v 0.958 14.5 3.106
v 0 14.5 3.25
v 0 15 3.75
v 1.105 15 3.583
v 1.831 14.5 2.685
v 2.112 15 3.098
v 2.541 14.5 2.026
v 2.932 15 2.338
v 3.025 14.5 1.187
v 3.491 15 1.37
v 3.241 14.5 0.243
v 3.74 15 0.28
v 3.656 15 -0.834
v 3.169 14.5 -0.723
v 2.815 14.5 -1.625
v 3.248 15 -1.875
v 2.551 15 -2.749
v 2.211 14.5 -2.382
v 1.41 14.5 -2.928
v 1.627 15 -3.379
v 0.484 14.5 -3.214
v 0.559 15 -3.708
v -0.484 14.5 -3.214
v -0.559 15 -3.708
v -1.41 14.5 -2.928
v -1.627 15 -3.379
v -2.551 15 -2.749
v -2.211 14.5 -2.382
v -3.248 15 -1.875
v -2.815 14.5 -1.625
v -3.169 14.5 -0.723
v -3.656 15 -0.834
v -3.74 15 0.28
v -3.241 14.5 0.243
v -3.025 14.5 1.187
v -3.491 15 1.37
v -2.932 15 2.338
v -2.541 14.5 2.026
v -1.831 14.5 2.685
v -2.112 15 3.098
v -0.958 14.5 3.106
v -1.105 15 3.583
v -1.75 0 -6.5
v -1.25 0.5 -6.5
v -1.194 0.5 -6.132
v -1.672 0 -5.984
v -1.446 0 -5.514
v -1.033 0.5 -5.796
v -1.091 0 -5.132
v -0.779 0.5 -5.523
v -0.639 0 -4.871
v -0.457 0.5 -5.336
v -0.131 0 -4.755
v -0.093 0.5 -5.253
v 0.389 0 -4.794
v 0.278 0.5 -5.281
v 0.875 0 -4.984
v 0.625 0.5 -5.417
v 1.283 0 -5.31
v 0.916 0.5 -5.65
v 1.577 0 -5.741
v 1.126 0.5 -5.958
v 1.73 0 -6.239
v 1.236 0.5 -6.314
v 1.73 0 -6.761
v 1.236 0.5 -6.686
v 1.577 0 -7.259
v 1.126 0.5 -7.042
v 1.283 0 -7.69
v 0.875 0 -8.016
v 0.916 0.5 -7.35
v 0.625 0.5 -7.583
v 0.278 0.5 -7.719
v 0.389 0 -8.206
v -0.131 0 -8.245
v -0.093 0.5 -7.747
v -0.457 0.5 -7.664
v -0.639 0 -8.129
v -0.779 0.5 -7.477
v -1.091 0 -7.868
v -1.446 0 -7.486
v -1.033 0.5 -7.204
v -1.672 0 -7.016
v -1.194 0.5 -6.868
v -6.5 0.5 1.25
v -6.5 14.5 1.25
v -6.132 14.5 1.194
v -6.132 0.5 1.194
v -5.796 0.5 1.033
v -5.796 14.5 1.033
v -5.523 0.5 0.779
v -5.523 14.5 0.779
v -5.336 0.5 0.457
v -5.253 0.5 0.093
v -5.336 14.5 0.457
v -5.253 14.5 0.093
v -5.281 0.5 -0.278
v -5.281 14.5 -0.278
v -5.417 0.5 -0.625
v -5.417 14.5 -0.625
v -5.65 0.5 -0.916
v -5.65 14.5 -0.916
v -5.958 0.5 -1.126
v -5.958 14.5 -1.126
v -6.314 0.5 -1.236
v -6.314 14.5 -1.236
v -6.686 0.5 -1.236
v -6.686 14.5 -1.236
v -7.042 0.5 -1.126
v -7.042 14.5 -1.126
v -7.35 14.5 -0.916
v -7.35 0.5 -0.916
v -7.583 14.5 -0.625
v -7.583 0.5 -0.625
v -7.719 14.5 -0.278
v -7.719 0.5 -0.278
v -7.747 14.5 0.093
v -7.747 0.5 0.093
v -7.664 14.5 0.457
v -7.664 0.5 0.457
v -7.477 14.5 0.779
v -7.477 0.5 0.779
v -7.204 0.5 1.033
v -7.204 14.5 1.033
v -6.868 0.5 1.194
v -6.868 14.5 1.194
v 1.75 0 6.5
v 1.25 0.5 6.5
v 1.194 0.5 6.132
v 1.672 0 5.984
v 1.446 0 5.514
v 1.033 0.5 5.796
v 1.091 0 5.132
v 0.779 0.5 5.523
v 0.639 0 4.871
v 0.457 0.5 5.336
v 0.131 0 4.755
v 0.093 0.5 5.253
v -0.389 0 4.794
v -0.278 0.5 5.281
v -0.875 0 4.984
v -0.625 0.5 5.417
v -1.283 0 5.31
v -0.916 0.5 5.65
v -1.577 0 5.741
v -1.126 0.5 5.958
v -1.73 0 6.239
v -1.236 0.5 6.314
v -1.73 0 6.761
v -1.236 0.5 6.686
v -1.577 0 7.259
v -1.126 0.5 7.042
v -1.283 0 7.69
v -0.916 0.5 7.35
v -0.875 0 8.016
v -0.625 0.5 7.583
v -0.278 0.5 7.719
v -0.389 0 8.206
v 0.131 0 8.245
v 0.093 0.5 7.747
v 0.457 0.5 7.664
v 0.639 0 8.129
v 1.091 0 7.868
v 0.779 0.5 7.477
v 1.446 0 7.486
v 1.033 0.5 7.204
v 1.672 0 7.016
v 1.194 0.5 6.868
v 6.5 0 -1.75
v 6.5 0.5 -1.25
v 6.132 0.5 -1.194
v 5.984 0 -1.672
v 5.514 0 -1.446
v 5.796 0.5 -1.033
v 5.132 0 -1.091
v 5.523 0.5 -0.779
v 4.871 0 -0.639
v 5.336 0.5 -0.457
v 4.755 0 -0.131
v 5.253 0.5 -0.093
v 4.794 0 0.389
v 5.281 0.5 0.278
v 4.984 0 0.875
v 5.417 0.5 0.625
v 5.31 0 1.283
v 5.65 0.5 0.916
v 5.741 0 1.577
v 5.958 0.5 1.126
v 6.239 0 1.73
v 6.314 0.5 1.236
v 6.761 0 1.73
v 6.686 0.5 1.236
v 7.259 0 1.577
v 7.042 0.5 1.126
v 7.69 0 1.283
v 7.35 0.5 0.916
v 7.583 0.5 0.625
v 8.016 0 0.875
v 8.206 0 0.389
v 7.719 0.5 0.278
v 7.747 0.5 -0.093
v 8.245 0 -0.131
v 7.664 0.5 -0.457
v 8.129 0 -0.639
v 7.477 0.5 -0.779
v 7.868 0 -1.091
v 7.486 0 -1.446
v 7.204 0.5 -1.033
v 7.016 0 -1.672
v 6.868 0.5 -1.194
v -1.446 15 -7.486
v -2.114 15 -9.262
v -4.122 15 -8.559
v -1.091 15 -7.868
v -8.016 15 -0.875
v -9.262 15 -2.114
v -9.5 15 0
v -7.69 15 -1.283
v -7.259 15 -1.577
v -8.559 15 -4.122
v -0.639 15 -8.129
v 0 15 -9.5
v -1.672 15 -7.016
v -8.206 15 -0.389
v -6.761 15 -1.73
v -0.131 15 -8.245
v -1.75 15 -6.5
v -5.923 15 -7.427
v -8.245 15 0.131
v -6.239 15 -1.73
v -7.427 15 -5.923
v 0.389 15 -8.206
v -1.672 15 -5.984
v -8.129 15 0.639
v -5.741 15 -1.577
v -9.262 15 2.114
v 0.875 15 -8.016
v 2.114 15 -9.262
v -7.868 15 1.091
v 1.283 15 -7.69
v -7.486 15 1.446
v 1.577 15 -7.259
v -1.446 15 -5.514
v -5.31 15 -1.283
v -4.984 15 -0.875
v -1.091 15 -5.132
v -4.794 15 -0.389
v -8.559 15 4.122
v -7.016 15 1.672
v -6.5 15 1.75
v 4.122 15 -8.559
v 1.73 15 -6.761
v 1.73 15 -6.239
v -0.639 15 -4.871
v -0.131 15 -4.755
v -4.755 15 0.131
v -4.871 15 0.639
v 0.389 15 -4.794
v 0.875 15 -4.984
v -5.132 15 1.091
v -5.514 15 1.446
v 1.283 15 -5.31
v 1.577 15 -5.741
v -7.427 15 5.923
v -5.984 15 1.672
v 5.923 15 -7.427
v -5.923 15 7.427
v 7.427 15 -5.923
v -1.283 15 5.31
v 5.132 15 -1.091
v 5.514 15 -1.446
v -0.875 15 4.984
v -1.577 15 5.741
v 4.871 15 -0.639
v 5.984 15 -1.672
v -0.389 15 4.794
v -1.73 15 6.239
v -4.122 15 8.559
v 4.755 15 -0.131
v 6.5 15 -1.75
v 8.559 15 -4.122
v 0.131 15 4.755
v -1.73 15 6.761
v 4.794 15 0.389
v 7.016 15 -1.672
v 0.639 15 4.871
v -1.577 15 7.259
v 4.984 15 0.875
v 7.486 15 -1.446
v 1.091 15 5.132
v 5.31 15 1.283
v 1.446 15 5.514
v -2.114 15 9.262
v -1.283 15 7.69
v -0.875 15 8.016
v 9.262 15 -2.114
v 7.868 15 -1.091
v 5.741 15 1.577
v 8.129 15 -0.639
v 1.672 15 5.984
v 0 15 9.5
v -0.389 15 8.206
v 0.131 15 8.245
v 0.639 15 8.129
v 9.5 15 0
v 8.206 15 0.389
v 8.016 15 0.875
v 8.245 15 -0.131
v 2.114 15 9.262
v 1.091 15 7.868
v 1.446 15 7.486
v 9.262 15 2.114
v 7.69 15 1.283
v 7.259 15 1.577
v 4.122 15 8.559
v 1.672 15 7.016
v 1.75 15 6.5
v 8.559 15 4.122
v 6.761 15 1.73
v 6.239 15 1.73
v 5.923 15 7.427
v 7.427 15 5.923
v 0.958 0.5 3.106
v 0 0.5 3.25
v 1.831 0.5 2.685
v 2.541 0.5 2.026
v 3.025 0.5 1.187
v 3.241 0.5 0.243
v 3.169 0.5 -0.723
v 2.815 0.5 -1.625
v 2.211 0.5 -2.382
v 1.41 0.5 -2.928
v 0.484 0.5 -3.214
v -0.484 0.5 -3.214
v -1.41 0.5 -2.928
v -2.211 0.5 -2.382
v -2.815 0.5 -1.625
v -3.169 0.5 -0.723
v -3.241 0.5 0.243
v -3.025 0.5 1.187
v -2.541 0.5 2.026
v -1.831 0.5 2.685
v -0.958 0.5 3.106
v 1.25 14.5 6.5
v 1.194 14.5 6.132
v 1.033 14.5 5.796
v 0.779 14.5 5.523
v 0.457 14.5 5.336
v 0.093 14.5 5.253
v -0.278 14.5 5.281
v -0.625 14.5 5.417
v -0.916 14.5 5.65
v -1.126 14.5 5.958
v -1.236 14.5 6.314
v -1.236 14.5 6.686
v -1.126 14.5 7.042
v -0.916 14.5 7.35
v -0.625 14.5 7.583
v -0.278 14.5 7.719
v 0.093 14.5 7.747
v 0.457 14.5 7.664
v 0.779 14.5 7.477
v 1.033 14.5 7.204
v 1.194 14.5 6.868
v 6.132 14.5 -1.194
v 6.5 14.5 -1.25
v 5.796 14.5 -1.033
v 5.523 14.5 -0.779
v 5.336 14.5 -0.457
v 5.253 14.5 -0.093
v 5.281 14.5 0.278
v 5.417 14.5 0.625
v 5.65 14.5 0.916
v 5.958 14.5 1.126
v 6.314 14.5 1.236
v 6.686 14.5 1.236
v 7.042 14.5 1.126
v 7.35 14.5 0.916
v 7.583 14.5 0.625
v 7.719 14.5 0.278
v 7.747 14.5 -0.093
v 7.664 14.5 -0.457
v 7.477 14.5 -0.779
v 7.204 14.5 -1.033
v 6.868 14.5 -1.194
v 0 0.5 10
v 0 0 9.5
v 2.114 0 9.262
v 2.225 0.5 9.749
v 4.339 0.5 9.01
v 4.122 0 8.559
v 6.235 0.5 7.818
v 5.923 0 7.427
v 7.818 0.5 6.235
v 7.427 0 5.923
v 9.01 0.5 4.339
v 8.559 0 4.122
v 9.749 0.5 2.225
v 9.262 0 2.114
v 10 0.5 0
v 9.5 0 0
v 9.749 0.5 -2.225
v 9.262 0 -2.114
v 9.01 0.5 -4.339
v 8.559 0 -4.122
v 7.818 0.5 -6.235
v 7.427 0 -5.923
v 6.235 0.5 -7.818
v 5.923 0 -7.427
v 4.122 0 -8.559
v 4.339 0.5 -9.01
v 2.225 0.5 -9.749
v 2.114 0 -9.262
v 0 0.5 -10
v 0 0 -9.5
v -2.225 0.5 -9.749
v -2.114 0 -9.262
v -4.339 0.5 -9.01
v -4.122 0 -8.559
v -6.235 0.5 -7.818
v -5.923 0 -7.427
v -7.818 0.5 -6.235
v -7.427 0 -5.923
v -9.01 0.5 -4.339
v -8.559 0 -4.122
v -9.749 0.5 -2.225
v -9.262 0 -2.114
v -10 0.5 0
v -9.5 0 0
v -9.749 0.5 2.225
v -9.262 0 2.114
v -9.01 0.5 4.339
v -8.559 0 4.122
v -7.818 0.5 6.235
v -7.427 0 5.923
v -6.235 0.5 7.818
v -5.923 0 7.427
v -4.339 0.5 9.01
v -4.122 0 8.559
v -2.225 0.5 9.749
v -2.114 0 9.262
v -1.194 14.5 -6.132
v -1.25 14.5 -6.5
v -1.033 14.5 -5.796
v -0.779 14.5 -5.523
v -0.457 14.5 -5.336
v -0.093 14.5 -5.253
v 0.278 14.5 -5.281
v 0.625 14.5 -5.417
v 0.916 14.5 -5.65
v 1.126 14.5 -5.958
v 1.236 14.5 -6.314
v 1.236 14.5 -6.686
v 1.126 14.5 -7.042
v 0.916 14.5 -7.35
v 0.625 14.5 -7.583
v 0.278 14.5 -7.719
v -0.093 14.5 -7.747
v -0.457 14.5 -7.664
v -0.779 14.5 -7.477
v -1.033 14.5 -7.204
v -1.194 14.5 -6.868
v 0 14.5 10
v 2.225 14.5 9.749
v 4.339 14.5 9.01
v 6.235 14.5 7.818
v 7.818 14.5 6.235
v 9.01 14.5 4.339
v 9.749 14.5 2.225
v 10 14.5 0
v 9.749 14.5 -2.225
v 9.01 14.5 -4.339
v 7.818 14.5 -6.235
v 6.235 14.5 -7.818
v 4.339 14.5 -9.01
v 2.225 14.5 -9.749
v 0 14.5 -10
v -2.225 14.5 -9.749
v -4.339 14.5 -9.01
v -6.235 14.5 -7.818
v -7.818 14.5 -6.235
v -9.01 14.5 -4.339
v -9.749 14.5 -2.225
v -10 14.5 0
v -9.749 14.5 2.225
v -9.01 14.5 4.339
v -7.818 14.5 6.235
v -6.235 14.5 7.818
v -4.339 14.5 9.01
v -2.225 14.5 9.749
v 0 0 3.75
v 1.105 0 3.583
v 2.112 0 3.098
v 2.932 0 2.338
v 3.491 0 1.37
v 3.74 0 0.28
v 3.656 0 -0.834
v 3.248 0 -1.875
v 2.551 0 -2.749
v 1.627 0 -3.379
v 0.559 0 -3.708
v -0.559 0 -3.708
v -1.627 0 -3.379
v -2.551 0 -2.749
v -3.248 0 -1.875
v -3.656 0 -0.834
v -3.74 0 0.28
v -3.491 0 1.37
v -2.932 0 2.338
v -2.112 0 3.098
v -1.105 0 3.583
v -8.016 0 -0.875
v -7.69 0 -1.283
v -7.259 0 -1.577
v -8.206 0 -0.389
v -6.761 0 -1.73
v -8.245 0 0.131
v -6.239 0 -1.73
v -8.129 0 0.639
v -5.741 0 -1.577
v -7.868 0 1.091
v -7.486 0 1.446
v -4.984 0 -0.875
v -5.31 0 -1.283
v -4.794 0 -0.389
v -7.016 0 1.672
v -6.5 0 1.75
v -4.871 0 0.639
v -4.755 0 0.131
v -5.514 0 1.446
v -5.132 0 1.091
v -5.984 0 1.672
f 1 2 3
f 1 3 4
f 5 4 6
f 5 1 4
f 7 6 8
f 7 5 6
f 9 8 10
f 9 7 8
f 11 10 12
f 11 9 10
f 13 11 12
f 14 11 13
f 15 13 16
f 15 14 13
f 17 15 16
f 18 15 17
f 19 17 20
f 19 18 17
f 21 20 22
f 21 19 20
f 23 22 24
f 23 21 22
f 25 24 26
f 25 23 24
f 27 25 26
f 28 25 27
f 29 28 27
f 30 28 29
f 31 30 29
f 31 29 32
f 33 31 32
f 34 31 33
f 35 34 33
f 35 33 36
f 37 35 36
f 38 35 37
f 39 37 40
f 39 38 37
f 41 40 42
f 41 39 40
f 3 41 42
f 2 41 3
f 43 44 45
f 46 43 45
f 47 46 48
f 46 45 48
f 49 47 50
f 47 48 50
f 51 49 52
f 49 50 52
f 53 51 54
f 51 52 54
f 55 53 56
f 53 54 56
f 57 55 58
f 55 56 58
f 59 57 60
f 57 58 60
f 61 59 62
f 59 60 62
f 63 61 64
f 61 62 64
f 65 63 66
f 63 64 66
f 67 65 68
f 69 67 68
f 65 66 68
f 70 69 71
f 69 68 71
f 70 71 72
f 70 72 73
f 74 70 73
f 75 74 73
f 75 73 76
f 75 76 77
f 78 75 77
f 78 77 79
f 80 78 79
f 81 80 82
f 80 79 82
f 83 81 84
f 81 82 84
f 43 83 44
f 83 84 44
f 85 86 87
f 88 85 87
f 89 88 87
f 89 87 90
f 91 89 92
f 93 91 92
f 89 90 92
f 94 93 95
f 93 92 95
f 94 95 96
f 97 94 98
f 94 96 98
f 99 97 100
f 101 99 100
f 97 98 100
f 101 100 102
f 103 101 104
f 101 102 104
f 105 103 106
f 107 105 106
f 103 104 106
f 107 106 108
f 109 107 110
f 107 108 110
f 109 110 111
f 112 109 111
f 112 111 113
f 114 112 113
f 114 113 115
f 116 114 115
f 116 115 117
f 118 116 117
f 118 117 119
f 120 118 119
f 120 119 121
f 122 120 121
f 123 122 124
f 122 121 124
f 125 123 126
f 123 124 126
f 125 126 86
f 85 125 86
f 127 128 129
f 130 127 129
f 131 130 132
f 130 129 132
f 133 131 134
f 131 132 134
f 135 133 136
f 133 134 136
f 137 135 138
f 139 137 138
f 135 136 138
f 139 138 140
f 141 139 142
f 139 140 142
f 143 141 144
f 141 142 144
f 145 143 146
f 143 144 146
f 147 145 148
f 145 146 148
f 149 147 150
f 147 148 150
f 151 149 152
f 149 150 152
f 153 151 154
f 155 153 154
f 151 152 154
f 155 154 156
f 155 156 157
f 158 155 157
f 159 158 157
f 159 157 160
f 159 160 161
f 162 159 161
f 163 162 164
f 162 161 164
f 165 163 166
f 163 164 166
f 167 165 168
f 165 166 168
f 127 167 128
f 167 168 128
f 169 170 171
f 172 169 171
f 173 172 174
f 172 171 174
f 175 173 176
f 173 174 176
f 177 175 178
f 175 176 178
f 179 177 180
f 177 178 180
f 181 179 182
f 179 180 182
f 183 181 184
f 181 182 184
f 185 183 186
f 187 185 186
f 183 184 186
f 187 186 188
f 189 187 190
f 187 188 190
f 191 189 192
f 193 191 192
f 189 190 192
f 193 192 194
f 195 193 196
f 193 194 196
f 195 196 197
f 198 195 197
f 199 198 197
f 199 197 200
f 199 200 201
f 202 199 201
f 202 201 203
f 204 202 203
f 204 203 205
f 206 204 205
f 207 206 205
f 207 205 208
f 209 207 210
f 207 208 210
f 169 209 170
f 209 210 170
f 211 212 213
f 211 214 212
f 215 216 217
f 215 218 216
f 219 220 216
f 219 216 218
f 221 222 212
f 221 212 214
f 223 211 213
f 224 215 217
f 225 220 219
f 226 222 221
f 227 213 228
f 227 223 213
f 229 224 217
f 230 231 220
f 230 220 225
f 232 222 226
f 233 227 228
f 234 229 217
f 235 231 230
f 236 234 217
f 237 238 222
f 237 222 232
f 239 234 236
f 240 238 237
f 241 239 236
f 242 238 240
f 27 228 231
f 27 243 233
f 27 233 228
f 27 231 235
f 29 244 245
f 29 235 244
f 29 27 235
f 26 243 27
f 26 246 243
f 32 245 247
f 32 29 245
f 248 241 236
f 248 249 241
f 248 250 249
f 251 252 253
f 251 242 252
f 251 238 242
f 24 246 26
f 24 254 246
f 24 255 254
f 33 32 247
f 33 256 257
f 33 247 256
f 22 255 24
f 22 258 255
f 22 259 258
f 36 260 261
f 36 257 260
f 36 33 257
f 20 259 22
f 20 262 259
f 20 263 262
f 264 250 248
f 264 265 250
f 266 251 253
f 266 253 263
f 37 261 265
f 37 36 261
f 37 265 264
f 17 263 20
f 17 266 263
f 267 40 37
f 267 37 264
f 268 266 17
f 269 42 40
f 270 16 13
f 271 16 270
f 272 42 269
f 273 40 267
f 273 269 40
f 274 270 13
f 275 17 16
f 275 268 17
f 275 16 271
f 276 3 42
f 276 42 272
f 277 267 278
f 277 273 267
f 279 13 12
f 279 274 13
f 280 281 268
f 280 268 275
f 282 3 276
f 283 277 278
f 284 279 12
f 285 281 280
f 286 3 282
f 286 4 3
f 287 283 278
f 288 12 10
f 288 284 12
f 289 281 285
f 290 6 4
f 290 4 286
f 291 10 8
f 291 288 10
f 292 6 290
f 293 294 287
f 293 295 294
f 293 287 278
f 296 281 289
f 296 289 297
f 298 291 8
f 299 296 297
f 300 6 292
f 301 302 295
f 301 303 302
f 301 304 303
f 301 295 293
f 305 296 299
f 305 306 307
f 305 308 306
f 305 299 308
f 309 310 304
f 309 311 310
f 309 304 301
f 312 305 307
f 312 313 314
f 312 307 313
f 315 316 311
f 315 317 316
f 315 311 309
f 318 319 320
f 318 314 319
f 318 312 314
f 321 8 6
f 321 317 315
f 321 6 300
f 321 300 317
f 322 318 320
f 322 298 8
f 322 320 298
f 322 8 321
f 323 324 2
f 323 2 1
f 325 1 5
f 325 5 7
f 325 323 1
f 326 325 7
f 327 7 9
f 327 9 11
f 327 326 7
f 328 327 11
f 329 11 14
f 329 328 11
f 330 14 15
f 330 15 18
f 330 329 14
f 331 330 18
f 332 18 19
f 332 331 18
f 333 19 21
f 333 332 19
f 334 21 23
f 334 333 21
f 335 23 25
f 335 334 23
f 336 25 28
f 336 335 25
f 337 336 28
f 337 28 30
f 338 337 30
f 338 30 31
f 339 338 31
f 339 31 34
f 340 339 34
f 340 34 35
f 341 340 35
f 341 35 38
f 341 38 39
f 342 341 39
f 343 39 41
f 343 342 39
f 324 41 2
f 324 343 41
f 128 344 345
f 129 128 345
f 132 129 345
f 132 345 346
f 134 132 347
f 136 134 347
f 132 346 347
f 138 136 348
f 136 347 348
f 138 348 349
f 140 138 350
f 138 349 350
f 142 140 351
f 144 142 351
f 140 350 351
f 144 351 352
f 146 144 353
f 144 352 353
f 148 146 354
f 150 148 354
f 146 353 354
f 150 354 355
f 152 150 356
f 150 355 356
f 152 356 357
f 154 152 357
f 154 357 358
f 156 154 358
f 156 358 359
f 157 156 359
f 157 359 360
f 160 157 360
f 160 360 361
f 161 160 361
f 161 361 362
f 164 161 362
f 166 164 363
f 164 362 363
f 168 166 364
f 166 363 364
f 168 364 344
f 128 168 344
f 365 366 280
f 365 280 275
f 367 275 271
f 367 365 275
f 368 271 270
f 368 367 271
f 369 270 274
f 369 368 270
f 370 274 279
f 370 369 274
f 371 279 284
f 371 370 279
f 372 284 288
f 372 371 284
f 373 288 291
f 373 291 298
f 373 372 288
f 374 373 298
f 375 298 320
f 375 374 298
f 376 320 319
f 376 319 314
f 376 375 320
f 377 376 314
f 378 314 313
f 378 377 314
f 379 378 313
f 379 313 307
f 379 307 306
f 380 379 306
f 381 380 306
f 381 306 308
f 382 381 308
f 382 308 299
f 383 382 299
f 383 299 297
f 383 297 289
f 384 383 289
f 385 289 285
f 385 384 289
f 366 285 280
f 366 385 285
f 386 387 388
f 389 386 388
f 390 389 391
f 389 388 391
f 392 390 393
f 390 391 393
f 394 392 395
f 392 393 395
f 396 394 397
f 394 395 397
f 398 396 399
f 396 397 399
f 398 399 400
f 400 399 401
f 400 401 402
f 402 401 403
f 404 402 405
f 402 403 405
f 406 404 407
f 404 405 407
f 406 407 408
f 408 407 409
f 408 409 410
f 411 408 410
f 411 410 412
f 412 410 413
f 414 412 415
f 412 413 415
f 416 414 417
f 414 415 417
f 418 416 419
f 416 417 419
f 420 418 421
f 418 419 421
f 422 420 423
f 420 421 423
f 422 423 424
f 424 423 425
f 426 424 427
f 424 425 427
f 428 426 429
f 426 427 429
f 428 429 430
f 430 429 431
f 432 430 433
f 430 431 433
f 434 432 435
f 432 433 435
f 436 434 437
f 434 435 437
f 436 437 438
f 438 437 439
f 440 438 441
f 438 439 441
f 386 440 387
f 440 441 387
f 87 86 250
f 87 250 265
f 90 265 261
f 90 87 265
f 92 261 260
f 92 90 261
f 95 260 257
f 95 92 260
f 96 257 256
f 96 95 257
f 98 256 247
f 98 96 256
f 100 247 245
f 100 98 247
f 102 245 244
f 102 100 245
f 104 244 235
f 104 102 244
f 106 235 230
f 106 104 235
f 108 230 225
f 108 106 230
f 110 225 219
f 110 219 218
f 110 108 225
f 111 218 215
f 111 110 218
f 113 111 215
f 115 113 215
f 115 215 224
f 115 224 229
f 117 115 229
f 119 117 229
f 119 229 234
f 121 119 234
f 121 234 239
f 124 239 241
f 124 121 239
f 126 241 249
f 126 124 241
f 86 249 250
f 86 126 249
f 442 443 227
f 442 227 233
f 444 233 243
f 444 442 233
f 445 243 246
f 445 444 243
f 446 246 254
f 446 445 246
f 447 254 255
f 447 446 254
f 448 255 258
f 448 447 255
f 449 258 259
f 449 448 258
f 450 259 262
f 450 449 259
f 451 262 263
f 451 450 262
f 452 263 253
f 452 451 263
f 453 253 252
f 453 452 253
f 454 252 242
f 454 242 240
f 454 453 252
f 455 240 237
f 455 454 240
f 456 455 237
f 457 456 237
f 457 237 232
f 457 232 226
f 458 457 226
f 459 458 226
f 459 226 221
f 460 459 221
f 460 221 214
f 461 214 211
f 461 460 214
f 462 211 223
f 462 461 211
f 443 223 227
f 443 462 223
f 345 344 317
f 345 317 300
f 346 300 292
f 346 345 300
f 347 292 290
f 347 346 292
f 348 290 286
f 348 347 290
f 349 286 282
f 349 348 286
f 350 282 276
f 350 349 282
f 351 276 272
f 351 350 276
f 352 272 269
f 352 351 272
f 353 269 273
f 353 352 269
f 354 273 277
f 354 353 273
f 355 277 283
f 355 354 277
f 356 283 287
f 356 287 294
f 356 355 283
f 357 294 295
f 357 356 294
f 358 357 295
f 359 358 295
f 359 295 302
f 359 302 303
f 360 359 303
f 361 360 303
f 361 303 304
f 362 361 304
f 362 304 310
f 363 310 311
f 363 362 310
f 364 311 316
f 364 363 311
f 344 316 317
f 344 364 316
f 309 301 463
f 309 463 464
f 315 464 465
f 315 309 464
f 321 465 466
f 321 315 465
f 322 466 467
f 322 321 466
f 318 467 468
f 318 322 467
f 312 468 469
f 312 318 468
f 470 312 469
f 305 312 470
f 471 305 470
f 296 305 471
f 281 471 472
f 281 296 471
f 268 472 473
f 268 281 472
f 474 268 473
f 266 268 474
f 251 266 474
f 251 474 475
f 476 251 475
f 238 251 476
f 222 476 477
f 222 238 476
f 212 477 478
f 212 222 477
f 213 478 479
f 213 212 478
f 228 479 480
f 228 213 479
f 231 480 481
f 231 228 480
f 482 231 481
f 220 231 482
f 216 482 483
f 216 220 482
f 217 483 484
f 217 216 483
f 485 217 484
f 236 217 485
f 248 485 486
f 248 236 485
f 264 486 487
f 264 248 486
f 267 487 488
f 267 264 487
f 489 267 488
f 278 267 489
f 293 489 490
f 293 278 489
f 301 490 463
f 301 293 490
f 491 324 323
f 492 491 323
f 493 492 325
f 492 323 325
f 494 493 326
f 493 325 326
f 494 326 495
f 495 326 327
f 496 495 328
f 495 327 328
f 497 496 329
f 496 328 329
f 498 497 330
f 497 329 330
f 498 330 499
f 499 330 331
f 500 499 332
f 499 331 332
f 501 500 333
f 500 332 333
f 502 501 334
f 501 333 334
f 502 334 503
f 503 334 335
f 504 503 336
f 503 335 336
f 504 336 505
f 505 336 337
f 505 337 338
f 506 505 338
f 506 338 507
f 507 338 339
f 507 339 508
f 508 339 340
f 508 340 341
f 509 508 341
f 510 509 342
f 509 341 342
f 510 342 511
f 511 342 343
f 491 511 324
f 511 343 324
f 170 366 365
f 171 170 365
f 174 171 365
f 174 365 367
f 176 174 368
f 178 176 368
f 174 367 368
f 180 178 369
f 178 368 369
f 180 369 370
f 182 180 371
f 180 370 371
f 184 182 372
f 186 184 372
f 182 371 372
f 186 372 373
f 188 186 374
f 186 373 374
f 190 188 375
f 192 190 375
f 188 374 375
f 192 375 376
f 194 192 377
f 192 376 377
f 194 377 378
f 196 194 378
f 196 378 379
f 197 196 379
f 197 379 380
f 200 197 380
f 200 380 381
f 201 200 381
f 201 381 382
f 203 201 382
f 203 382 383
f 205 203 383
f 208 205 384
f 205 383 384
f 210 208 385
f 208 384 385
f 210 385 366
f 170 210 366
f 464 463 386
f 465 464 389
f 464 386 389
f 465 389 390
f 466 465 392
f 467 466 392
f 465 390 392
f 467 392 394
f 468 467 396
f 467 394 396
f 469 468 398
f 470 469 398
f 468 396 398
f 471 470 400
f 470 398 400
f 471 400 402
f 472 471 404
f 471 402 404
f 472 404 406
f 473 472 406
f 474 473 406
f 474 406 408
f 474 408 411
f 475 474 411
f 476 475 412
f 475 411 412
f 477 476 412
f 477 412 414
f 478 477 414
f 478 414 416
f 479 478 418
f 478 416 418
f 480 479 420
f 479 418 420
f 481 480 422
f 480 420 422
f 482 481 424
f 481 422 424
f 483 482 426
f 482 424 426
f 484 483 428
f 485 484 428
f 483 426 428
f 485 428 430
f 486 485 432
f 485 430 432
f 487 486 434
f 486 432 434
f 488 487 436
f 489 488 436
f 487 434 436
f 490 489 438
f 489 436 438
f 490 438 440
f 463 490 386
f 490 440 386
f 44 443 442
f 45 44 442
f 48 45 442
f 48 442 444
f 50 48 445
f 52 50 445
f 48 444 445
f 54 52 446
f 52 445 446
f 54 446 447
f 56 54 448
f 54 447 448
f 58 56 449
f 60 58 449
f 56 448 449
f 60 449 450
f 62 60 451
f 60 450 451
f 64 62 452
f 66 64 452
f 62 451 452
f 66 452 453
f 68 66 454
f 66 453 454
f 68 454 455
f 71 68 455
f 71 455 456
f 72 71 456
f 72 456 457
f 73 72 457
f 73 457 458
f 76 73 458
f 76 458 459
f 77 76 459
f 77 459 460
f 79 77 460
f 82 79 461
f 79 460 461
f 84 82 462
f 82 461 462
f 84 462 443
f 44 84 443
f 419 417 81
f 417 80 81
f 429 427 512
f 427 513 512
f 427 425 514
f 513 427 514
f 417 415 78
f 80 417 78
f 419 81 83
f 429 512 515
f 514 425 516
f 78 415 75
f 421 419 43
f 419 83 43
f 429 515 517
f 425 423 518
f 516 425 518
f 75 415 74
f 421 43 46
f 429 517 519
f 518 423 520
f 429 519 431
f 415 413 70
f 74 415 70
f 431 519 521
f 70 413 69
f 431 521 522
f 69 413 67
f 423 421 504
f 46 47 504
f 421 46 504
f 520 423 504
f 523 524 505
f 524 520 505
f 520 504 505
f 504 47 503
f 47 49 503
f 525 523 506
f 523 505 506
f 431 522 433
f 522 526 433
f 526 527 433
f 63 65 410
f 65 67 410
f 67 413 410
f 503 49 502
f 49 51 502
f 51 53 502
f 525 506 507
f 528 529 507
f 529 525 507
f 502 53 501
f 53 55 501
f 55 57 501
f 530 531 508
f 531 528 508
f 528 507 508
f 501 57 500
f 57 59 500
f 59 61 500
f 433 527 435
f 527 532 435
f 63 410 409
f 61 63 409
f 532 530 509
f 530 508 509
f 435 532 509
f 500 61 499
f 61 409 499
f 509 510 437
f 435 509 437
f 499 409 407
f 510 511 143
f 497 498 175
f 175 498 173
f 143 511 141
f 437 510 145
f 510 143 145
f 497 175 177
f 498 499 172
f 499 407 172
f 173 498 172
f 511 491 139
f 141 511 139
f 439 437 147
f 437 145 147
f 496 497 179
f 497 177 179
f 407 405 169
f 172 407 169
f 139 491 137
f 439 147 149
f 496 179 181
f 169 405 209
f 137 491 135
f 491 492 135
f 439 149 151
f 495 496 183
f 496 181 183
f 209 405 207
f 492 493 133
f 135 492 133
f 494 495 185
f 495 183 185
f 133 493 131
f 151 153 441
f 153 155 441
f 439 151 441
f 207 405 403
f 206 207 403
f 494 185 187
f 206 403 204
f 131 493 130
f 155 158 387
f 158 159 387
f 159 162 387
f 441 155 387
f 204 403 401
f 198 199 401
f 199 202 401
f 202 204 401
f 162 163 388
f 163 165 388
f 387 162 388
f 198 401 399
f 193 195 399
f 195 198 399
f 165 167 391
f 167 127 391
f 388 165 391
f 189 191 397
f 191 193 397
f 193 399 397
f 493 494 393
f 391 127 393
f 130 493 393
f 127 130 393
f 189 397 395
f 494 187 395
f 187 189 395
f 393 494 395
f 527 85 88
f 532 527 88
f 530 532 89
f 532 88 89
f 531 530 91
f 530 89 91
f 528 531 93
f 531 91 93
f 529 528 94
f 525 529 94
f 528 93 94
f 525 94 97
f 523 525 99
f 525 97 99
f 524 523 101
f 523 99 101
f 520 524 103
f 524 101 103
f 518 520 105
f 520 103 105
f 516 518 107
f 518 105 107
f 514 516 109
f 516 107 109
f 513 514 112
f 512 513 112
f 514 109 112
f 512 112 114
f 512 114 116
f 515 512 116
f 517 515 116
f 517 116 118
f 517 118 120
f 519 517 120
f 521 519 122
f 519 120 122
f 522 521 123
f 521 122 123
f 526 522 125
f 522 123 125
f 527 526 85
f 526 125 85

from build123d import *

# Parameters (mm, degrees)
SKETCH_1_R               = 10
SKETCH_1_R_2             = 3.25
EXTRUDE_1_DEPTH          = 15
SKETCH_2_R               = 1.25
CUT_EXTRUDE_1_DEPTH      = 15
PATTERN_CIRCULAR_1_COUNT = 4
CHAMFER_1_SIZE           = 0.5


with BuildPart() as part:
    # 草图1 → 凸台-拉伸1 (new body)
    with BuildSketch(Plane(origin=(0, 0, 0), x_dir=(1, 0, 0), z_dir=(0, 1, 0))):
        with Locations(Location((0, 0, 0), (0, 0, 270))):
            Circle(SKETCH_1_R)
        with Locations(Location((0, 0, 0), (0, 0, 270))):
            Circle(SKETCH_1_R_2, mode=Mode.SUBTRACT)
    extrude(amount=EXTRUDE_1_DEPTH)

    # 草图2 → 切除-拉伸1 (cut)
    with BuildSketch(Plane(origin=(0, 15, 0), x_dir=(1, 0, 0), z_dir=(0, 1, 0))):
        with Locations(Location((-6.5, 0, 0), (0, 0, 270))):
            Circle(SKETCH_2_R)
    cut_extrude_1 = extrude(amount=-CUT_EXTRUDE_1_DEPTH, mode=Mode.SUBTRACT)

    # 阵列(圆周)1: 切除-拉伸1 ×4 about axis
    pattern_circular_1_axis = Axis((0, 0, 0), (0, 1, 0))
    for i in range(1, PATTERN_CIRCULAR_1_COUNT):
        add(cut_extrude_1.rotate(pattern_circular_1_axis, i * 360 / PATTERN_CIRCULAR_1_COUNT), mode=Mode.SUBTRACT)

    # 倒角1
    chamfer_1_edges = [part.edges().sort_by_distance(p)[0] for p in [
        (-6.5, 0, -1.25),
        (-6.5, 15, -1.25),
        (1.25, 0, -6.5),
        (1.25, 15, -6.5),
        (0, 0, -10),
        (6.5, 0, 1.25),
        (6.5, 15, 1.25),
        (-1.25, 0, 6.5),
        (-1.25, 15, 6.5),
        (0, 15, -10),
        (0, 0, -3.25),
        (0, 15, -3.25),
    ]]
    chamfer(chamfer_1_edges, length=CHAMFER_1_SIZE)


solid = part.part
